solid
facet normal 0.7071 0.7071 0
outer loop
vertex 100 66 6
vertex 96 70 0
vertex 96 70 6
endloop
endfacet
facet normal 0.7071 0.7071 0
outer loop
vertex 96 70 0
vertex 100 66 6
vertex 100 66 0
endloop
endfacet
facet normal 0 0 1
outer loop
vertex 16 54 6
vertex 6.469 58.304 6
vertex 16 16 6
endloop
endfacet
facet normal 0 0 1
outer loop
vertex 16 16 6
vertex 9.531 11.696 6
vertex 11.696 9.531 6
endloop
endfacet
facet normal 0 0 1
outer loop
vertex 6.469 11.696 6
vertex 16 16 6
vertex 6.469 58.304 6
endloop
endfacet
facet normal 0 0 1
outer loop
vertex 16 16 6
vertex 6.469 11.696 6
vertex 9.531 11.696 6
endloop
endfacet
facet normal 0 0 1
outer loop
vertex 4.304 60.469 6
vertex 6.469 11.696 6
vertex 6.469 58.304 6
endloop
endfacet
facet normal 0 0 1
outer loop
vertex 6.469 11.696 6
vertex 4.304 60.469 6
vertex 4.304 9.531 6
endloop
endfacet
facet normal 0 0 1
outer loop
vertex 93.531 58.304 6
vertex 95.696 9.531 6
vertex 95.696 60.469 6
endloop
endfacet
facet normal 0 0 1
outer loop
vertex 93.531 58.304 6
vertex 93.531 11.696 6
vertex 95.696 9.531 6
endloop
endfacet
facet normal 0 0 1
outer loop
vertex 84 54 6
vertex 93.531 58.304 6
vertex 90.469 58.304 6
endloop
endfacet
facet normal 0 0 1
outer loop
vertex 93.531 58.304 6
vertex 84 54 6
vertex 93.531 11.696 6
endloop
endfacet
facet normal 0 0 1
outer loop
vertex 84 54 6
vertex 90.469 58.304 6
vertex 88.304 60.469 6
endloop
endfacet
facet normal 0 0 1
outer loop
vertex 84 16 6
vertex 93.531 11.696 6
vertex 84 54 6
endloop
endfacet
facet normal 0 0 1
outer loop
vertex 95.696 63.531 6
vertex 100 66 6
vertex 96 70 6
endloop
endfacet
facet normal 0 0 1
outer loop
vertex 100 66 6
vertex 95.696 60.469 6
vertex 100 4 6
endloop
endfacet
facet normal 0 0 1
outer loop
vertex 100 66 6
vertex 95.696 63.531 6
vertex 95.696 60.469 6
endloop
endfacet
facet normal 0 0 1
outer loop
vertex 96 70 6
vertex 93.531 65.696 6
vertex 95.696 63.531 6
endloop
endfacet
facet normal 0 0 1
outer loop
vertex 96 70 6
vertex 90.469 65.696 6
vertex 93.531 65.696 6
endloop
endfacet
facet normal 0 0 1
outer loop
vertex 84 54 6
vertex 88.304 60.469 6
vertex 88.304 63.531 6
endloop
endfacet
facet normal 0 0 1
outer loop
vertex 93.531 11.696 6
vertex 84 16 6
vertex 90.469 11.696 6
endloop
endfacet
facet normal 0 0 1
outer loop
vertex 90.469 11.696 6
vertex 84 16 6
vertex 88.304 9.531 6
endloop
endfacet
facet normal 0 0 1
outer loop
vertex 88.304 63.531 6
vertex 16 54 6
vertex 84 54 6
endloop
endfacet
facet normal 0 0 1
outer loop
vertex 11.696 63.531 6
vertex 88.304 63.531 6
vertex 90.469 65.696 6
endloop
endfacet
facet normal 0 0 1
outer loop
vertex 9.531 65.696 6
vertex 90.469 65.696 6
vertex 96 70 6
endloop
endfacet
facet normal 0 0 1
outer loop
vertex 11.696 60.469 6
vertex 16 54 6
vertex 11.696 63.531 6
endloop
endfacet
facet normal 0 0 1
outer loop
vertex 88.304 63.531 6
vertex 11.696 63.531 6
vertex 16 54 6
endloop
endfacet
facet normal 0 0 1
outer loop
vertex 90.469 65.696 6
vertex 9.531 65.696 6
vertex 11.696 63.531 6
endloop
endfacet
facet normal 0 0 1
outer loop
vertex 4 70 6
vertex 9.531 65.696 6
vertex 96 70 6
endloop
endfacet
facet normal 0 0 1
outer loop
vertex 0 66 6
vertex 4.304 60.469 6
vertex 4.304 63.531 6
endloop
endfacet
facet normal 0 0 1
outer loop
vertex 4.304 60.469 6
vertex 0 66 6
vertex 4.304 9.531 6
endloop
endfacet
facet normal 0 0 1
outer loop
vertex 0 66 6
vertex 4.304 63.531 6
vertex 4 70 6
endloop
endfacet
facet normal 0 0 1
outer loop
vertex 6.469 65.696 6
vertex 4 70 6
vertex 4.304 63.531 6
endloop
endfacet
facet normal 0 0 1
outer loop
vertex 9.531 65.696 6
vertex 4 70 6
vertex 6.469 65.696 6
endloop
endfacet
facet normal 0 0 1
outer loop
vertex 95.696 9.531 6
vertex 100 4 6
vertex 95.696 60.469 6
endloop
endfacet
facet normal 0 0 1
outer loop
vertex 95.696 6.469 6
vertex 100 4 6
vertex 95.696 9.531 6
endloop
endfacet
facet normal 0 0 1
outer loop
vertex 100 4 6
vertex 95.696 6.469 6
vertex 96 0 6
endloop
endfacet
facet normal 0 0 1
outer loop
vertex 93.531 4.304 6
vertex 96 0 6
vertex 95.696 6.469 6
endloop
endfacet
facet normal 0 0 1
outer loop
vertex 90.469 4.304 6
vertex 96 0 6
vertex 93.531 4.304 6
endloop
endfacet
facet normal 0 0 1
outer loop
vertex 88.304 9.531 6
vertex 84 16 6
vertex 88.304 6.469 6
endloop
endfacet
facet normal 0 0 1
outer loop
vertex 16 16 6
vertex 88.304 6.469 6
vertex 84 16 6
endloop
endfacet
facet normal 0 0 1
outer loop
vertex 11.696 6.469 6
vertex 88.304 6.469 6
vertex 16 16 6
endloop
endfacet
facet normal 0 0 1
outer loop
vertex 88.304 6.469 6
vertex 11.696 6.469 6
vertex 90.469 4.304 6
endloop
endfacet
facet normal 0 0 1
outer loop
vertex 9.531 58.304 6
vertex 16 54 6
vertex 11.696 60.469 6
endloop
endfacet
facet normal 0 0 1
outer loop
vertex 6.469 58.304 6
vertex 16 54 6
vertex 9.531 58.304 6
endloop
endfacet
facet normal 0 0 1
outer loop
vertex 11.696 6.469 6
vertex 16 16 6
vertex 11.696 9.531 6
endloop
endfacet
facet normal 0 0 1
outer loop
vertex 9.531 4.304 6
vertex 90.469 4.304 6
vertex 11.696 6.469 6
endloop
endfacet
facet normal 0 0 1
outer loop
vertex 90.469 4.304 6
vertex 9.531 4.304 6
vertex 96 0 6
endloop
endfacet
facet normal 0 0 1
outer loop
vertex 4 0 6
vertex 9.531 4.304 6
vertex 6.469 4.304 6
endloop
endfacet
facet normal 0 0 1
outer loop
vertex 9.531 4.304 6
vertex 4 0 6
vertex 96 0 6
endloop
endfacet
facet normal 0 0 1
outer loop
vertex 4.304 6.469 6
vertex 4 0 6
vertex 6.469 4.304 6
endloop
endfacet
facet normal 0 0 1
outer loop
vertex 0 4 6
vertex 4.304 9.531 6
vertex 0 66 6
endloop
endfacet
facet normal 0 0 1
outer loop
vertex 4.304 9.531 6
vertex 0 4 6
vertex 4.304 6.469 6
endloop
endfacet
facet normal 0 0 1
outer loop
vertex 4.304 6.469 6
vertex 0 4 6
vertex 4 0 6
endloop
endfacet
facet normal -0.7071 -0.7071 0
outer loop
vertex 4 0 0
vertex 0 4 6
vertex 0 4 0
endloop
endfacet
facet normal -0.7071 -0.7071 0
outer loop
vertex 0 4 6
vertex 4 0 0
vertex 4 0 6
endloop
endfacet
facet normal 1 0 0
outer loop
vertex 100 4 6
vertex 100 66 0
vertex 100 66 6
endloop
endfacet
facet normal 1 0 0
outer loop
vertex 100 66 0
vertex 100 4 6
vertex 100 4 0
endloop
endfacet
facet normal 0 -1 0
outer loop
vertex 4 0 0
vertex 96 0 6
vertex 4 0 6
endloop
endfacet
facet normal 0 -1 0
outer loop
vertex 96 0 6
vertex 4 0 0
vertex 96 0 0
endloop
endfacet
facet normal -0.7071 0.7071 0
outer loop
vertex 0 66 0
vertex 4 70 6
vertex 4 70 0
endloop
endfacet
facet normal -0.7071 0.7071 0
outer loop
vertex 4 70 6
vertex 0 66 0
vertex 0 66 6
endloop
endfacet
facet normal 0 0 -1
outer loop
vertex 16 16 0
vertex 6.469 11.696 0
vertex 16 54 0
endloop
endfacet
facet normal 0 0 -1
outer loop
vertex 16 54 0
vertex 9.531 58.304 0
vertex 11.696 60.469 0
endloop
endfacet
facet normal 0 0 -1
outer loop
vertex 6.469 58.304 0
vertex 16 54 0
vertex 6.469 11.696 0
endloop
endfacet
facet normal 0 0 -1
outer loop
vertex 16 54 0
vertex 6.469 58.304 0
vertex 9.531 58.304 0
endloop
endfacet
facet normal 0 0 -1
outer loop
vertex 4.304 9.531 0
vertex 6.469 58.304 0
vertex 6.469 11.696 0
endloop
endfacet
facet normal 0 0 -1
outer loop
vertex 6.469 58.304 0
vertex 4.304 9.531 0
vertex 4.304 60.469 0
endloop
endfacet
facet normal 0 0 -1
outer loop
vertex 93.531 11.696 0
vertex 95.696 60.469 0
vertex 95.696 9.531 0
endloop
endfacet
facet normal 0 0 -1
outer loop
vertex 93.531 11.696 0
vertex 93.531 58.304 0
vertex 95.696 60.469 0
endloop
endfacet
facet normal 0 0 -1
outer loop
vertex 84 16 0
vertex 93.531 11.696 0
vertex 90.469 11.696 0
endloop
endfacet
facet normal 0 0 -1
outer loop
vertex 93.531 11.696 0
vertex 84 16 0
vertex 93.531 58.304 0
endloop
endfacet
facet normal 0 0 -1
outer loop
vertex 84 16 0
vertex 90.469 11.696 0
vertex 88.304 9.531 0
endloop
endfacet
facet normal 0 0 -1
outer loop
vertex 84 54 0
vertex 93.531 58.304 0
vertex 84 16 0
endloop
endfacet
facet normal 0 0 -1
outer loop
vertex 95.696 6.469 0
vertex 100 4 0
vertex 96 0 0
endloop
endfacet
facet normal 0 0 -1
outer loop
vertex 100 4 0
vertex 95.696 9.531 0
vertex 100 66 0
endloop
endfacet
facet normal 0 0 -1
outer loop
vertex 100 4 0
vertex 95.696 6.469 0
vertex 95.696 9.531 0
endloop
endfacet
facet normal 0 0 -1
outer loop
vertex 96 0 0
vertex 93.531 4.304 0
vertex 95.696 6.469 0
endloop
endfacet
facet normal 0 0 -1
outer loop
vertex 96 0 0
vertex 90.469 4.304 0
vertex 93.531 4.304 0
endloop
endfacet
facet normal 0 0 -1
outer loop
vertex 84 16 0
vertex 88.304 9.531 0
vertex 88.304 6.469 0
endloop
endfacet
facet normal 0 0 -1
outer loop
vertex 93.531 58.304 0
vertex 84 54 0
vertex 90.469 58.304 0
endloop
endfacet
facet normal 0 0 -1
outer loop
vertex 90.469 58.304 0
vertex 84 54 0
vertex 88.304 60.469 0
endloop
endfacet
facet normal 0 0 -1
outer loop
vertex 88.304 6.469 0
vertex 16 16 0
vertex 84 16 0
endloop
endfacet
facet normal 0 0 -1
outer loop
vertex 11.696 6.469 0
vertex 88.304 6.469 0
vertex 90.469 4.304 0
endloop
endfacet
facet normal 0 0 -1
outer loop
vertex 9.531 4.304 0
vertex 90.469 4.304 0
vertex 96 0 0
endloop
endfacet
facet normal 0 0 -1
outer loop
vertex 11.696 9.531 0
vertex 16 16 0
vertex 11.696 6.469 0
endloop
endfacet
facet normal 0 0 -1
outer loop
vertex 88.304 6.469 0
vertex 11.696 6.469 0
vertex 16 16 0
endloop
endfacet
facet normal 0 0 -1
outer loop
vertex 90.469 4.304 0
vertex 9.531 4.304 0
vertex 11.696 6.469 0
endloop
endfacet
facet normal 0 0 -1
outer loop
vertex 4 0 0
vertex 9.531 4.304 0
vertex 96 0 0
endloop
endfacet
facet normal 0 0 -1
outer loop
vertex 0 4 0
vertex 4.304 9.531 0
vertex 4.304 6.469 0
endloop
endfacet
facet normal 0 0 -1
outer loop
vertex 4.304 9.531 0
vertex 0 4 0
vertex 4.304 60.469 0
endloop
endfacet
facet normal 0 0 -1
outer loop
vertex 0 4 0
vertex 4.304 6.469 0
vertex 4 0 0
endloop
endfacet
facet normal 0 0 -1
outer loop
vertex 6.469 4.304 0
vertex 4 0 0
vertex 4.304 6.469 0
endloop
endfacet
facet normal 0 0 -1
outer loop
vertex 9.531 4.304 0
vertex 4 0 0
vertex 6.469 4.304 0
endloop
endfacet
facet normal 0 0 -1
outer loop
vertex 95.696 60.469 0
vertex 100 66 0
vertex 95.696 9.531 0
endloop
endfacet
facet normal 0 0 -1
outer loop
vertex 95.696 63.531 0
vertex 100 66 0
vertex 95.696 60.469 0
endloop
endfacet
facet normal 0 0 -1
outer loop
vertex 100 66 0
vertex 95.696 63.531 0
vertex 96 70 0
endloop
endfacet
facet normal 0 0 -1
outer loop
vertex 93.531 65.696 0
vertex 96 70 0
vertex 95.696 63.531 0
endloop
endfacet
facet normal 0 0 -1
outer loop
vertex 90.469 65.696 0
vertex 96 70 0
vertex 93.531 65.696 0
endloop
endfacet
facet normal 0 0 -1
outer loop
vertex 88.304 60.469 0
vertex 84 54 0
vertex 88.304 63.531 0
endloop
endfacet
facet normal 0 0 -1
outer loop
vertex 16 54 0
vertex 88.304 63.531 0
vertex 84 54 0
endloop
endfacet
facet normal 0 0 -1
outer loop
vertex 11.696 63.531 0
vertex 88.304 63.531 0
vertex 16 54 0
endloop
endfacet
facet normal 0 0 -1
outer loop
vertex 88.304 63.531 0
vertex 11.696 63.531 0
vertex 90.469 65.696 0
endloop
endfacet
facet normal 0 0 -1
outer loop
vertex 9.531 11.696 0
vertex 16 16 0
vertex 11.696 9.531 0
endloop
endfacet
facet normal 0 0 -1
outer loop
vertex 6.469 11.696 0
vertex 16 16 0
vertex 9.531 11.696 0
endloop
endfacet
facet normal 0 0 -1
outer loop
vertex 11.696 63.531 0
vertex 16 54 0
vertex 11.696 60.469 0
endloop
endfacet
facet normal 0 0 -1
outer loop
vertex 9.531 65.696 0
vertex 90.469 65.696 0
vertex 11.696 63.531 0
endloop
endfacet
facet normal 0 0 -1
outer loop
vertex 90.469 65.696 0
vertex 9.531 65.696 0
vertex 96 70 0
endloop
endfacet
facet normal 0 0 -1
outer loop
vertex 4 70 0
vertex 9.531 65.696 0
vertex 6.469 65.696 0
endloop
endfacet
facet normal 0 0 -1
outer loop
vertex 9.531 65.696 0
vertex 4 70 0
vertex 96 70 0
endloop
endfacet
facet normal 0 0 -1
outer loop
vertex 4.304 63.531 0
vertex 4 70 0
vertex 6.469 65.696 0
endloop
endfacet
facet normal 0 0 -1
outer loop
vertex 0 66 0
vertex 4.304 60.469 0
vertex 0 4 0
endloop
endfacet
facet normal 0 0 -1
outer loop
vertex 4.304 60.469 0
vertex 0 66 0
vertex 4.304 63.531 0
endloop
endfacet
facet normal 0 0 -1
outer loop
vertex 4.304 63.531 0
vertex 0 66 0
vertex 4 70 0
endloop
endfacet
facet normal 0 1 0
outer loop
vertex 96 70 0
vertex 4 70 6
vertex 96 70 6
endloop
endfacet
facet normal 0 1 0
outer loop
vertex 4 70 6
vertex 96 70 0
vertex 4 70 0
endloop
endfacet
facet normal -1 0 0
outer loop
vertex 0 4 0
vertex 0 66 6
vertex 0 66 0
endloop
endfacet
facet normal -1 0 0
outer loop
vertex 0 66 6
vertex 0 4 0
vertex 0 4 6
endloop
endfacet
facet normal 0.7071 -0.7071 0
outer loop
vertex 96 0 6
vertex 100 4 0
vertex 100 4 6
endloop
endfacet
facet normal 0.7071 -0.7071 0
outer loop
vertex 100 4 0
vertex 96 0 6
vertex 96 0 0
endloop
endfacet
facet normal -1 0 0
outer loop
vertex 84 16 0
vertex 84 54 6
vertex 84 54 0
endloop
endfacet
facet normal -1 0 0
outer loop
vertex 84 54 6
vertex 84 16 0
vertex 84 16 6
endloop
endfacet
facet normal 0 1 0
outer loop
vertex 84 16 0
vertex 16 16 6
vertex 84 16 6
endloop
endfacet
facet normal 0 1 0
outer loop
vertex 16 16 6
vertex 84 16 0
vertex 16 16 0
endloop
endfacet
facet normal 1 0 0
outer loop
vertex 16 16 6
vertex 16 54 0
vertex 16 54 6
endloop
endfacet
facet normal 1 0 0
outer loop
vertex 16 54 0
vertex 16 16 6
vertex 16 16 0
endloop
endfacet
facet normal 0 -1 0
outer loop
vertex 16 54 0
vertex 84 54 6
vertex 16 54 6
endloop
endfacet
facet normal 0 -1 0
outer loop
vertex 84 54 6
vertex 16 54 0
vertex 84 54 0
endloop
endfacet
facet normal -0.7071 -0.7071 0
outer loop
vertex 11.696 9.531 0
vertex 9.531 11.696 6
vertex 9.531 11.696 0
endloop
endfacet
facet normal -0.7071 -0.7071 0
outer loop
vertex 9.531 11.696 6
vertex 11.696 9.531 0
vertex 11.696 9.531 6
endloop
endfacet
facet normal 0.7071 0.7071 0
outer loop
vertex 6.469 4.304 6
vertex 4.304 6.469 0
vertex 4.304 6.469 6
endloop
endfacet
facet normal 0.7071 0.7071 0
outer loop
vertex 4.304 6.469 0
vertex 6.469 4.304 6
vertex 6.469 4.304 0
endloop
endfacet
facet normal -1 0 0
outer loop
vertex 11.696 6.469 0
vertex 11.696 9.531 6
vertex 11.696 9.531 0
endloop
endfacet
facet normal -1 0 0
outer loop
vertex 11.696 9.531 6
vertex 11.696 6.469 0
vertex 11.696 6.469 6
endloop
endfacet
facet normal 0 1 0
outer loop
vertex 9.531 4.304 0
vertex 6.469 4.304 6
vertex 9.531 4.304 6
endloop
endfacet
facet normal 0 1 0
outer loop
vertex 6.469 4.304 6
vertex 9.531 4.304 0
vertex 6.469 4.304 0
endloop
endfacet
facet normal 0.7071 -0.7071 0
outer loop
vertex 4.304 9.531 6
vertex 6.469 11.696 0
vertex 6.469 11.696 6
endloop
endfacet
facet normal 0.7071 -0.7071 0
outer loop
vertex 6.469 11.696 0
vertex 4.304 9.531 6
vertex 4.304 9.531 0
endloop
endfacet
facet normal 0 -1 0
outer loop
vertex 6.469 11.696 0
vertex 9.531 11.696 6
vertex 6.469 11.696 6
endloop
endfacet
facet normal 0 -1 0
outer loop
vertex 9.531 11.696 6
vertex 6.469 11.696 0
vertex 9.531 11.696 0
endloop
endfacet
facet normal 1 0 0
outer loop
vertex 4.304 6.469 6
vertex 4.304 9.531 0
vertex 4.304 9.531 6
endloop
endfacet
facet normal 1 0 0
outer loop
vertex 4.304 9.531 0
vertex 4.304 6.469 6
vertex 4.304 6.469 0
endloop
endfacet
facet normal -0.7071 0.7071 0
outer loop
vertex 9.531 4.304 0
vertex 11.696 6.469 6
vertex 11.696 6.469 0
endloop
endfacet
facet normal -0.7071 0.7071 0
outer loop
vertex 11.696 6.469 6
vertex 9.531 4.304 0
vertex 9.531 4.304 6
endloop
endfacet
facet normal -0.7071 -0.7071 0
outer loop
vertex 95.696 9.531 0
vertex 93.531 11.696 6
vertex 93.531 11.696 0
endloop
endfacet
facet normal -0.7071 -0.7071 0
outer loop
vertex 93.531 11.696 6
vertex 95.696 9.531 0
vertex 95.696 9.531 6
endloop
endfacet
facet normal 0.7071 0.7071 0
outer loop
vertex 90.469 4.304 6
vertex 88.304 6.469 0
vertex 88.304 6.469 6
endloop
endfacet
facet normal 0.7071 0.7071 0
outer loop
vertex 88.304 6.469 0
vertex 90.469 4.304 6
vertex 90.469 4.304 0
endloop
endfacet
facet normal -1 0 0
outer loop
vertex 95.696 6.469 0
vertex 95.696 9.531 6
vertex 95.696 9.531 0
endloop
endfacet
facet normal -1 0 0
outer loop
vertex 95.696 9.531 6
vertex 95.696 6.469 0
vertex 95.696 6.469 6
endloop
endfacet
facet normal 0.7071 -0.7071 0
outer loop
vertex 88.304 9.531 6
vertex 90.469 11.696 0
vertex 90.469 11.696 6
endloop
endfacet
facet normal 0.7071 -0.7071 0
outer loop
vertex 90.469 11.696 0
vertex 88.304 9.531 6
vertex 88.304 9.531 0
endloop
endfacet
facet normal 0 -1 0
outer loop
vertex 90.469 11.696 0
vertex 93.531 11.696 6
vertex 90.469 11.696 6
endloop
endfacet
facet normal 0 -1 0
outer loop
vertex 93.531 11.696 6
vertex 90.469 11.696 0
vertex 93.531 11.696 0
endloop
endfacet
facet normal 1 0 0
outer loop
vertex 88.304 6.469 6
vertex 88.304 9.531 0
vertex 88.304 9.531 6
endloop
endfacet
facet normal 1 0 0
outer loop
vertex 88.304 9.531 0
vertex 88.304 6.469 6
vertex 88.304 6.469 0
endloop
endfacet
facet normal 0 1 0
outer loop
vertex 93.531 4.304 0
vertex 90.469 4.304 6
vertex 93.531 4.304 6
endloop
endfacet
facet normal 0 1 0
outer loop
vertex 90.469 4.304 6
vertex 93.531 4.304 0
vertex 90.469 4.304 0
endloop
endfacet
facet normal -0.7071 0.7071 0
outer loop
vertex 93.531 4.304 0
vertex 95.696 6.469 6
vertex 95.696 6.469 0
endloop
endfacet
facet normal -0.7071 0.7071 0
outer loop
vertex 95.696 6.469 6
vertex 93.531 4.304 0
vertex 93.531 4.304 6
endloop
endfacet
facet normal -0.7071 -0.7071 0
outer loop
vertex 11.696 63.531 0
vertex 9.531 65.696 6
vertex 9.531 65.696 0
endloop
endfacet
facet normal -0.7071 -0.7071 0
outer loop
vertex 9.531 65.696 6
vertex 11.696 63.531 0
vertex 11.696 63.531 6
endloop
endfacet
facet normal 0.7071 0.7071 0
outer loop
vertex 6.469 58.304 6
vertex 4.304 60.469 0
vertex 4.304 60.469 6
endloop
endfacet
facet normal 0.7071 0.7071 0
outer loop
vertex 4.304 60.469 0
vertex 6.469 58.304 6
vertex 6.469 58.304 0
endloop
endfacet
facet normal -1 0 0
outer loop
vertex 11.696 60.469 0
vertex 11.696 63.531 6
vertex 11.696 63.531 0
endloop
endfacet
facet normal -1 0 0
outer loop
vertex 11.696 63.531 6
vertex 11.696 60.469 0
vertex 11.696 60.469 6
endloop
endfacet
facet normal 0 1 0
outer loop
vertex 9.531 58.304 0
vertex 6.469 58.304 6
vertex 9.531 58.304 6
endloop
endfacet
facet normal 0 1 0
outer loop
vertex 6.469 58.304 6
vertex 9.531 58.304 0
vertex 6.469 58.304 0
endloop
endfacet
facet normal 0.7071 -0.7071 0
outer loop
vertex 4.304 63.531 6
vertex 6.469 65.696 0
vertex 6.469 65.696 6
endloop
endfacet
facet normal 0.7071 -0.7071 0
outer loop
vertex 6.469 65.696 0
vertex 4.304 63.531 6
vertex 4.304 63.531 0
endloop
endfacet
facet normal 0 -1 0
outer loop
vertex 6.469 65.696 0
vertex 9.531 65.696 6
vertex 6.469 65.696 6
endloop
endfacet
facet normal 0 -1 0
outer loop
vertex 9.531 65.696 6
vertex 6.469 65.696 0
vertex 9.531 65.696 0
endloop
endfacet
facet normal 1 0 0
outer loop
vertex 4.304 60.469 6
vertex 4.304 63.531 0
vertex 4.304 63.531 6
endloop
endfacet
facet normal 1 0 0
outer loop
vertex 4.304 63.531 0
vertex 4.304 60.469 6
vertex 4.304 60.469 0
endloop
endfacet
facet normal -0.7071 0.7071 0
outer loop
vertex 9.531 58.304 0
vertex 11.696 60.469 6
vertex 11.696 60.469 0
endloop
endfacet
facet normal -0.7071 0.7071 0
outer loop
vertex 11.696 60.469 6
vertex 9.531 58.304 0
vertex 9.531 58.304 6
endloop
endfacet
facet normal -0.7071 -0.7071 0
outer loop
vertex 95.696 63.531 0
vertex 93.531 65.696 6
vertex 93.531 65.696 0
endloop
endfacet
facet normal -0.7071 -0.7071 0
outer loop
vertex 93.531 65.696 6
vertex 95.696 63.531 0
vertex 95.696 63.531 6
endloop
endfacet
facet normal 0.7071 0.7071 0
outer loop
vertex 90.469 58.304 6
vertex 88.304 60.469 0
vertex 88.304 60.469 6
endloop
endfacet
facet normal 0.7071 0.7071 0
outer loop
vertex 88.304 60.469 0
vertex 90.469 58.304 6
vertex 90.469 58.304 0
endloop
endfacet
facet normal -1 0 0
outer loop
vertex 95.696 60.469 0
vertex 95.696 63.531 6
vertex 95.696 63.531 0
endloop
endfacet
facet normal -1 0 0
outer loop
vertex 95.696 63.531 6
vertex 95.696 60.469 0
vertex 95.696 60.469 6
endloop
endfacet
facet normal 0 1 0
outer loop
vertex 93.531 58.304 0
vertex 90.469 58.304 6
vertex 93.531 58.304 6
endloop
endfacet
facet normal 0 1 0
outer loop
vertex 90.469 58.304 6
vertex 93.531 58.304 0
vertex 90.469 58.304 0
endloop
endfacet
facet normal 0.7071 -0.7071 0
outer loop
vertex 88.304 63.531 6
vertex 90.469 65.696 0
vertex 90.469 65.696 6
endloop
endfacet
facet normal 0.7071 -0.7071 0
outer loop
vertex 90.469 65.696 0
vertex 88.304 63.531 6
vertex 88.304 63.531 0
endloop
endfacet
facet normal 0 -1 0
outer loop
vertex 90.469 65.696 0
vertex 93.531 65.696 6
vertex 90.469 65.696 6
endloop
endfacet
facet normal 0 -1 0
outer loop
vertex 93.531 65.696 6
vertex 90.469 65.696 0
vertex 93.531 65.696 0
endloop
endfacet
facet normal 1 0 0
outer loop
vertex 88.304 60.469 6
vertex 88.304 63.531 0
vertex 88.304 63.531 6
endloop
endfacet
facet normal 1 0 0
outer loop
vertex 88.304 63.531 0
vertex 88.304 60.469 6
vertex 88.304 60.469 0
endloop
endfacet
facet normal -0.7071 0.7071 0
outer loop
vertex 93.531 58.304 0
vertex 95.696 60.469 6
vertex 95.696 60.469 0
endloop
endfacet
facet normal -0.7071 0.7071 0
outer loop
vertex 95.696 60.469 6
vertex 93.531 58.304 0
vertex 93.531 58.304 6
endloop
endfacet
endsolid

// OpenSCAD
$fn = 32;

// ----------------------------------------------------------------------
// Frame plate: 100 x 70 frame, 16 mm rails
// ----------------------------------------------------------------------

// --- parameters (mm) ---
plate_l = 100;            // plate length, X
plate_w = 70;             // plate width, Y
plate_t = 6;              // plate thickness, Z (extrusion height)
corner_c = 4;             // corner chamfer
frame_bar = 16;           // frame rail width
bolt_r = 4;               // corner bolt window radius
bolt_inset = 8;           // bolt centre inset from the edges

win_l = plate_l - 2 * frame_bar;  // window length
win_w = plate_w - 2 * frame_bar;  // window width
bolt_d = 2 * bolt_r;  // corner hole diameter

profile = [[4, 0], [96, 0], [100, 4], [100, 66], [96, 70], [4, 70], [0, 66], [0, 4]];  // primary outline, 8 points, counter clockwise
void_1 = [[16, 16], [84, 16], [84, 54], [16, 54]];  // the window, 4 points
void_2 = [[11.696, 9.531], [9.531, 11.696], [6.469, 11.696], [4.304, 9.531], [4.304, 6.469], [6.469, 4.304], [9.531, 4.304], [11.696, 6.469]];  // corner bolt window, 8 points
void_3 = [[95.696, 9.531], [93.531, 11.696], [90.469, 11.696], [88.304, 9.531], [88.304, 6.469], [90.469, 4.304], [93.531, 4.304], [95.696, 6.469]];  // corner bolt window, 8 points
void_4 = [[11.696, 63.531], [9.531, 65.696], [6.469, 65.696], [4.304, 63.531], [4.304, 60.469], [6.469, 58.304], [9.531, 58.304], [11.696, 60.469]];  // corner bolt window, 8 points
void_5 = [[95.696, 63.531], [93.531, 65.696], [90.469, 65.696], [88.304, 63.531], [88.304, 60.469], [90.469, 58.304], [93.531, 58.304], [95.696, 60.469]];  // corner bolt window, 8 points

// --- the one profile operation ---
difference() {
  linear_extrude(height = plate_t) polygon(points = profile);
  translate([0, 0, -1])
    linear_extrude(height = plate_t + 2) polygon(points = void_1);
  translate([0, 0, -1])
    linear_extrude(height = plate_t + 2) polygon(points = void_2);
  translate([0, 0, -1])
    linear_extrude(height = plate_t + 2) polygon(points = void_3);
  translate([0, 0, -1])
    linear_extrude(height = plate_t + 2) polygon(points = void_4);
  translate([0, 0, -1])
    linear_extrude(height = plate_t + 2) polygon(points = void_5);
}
